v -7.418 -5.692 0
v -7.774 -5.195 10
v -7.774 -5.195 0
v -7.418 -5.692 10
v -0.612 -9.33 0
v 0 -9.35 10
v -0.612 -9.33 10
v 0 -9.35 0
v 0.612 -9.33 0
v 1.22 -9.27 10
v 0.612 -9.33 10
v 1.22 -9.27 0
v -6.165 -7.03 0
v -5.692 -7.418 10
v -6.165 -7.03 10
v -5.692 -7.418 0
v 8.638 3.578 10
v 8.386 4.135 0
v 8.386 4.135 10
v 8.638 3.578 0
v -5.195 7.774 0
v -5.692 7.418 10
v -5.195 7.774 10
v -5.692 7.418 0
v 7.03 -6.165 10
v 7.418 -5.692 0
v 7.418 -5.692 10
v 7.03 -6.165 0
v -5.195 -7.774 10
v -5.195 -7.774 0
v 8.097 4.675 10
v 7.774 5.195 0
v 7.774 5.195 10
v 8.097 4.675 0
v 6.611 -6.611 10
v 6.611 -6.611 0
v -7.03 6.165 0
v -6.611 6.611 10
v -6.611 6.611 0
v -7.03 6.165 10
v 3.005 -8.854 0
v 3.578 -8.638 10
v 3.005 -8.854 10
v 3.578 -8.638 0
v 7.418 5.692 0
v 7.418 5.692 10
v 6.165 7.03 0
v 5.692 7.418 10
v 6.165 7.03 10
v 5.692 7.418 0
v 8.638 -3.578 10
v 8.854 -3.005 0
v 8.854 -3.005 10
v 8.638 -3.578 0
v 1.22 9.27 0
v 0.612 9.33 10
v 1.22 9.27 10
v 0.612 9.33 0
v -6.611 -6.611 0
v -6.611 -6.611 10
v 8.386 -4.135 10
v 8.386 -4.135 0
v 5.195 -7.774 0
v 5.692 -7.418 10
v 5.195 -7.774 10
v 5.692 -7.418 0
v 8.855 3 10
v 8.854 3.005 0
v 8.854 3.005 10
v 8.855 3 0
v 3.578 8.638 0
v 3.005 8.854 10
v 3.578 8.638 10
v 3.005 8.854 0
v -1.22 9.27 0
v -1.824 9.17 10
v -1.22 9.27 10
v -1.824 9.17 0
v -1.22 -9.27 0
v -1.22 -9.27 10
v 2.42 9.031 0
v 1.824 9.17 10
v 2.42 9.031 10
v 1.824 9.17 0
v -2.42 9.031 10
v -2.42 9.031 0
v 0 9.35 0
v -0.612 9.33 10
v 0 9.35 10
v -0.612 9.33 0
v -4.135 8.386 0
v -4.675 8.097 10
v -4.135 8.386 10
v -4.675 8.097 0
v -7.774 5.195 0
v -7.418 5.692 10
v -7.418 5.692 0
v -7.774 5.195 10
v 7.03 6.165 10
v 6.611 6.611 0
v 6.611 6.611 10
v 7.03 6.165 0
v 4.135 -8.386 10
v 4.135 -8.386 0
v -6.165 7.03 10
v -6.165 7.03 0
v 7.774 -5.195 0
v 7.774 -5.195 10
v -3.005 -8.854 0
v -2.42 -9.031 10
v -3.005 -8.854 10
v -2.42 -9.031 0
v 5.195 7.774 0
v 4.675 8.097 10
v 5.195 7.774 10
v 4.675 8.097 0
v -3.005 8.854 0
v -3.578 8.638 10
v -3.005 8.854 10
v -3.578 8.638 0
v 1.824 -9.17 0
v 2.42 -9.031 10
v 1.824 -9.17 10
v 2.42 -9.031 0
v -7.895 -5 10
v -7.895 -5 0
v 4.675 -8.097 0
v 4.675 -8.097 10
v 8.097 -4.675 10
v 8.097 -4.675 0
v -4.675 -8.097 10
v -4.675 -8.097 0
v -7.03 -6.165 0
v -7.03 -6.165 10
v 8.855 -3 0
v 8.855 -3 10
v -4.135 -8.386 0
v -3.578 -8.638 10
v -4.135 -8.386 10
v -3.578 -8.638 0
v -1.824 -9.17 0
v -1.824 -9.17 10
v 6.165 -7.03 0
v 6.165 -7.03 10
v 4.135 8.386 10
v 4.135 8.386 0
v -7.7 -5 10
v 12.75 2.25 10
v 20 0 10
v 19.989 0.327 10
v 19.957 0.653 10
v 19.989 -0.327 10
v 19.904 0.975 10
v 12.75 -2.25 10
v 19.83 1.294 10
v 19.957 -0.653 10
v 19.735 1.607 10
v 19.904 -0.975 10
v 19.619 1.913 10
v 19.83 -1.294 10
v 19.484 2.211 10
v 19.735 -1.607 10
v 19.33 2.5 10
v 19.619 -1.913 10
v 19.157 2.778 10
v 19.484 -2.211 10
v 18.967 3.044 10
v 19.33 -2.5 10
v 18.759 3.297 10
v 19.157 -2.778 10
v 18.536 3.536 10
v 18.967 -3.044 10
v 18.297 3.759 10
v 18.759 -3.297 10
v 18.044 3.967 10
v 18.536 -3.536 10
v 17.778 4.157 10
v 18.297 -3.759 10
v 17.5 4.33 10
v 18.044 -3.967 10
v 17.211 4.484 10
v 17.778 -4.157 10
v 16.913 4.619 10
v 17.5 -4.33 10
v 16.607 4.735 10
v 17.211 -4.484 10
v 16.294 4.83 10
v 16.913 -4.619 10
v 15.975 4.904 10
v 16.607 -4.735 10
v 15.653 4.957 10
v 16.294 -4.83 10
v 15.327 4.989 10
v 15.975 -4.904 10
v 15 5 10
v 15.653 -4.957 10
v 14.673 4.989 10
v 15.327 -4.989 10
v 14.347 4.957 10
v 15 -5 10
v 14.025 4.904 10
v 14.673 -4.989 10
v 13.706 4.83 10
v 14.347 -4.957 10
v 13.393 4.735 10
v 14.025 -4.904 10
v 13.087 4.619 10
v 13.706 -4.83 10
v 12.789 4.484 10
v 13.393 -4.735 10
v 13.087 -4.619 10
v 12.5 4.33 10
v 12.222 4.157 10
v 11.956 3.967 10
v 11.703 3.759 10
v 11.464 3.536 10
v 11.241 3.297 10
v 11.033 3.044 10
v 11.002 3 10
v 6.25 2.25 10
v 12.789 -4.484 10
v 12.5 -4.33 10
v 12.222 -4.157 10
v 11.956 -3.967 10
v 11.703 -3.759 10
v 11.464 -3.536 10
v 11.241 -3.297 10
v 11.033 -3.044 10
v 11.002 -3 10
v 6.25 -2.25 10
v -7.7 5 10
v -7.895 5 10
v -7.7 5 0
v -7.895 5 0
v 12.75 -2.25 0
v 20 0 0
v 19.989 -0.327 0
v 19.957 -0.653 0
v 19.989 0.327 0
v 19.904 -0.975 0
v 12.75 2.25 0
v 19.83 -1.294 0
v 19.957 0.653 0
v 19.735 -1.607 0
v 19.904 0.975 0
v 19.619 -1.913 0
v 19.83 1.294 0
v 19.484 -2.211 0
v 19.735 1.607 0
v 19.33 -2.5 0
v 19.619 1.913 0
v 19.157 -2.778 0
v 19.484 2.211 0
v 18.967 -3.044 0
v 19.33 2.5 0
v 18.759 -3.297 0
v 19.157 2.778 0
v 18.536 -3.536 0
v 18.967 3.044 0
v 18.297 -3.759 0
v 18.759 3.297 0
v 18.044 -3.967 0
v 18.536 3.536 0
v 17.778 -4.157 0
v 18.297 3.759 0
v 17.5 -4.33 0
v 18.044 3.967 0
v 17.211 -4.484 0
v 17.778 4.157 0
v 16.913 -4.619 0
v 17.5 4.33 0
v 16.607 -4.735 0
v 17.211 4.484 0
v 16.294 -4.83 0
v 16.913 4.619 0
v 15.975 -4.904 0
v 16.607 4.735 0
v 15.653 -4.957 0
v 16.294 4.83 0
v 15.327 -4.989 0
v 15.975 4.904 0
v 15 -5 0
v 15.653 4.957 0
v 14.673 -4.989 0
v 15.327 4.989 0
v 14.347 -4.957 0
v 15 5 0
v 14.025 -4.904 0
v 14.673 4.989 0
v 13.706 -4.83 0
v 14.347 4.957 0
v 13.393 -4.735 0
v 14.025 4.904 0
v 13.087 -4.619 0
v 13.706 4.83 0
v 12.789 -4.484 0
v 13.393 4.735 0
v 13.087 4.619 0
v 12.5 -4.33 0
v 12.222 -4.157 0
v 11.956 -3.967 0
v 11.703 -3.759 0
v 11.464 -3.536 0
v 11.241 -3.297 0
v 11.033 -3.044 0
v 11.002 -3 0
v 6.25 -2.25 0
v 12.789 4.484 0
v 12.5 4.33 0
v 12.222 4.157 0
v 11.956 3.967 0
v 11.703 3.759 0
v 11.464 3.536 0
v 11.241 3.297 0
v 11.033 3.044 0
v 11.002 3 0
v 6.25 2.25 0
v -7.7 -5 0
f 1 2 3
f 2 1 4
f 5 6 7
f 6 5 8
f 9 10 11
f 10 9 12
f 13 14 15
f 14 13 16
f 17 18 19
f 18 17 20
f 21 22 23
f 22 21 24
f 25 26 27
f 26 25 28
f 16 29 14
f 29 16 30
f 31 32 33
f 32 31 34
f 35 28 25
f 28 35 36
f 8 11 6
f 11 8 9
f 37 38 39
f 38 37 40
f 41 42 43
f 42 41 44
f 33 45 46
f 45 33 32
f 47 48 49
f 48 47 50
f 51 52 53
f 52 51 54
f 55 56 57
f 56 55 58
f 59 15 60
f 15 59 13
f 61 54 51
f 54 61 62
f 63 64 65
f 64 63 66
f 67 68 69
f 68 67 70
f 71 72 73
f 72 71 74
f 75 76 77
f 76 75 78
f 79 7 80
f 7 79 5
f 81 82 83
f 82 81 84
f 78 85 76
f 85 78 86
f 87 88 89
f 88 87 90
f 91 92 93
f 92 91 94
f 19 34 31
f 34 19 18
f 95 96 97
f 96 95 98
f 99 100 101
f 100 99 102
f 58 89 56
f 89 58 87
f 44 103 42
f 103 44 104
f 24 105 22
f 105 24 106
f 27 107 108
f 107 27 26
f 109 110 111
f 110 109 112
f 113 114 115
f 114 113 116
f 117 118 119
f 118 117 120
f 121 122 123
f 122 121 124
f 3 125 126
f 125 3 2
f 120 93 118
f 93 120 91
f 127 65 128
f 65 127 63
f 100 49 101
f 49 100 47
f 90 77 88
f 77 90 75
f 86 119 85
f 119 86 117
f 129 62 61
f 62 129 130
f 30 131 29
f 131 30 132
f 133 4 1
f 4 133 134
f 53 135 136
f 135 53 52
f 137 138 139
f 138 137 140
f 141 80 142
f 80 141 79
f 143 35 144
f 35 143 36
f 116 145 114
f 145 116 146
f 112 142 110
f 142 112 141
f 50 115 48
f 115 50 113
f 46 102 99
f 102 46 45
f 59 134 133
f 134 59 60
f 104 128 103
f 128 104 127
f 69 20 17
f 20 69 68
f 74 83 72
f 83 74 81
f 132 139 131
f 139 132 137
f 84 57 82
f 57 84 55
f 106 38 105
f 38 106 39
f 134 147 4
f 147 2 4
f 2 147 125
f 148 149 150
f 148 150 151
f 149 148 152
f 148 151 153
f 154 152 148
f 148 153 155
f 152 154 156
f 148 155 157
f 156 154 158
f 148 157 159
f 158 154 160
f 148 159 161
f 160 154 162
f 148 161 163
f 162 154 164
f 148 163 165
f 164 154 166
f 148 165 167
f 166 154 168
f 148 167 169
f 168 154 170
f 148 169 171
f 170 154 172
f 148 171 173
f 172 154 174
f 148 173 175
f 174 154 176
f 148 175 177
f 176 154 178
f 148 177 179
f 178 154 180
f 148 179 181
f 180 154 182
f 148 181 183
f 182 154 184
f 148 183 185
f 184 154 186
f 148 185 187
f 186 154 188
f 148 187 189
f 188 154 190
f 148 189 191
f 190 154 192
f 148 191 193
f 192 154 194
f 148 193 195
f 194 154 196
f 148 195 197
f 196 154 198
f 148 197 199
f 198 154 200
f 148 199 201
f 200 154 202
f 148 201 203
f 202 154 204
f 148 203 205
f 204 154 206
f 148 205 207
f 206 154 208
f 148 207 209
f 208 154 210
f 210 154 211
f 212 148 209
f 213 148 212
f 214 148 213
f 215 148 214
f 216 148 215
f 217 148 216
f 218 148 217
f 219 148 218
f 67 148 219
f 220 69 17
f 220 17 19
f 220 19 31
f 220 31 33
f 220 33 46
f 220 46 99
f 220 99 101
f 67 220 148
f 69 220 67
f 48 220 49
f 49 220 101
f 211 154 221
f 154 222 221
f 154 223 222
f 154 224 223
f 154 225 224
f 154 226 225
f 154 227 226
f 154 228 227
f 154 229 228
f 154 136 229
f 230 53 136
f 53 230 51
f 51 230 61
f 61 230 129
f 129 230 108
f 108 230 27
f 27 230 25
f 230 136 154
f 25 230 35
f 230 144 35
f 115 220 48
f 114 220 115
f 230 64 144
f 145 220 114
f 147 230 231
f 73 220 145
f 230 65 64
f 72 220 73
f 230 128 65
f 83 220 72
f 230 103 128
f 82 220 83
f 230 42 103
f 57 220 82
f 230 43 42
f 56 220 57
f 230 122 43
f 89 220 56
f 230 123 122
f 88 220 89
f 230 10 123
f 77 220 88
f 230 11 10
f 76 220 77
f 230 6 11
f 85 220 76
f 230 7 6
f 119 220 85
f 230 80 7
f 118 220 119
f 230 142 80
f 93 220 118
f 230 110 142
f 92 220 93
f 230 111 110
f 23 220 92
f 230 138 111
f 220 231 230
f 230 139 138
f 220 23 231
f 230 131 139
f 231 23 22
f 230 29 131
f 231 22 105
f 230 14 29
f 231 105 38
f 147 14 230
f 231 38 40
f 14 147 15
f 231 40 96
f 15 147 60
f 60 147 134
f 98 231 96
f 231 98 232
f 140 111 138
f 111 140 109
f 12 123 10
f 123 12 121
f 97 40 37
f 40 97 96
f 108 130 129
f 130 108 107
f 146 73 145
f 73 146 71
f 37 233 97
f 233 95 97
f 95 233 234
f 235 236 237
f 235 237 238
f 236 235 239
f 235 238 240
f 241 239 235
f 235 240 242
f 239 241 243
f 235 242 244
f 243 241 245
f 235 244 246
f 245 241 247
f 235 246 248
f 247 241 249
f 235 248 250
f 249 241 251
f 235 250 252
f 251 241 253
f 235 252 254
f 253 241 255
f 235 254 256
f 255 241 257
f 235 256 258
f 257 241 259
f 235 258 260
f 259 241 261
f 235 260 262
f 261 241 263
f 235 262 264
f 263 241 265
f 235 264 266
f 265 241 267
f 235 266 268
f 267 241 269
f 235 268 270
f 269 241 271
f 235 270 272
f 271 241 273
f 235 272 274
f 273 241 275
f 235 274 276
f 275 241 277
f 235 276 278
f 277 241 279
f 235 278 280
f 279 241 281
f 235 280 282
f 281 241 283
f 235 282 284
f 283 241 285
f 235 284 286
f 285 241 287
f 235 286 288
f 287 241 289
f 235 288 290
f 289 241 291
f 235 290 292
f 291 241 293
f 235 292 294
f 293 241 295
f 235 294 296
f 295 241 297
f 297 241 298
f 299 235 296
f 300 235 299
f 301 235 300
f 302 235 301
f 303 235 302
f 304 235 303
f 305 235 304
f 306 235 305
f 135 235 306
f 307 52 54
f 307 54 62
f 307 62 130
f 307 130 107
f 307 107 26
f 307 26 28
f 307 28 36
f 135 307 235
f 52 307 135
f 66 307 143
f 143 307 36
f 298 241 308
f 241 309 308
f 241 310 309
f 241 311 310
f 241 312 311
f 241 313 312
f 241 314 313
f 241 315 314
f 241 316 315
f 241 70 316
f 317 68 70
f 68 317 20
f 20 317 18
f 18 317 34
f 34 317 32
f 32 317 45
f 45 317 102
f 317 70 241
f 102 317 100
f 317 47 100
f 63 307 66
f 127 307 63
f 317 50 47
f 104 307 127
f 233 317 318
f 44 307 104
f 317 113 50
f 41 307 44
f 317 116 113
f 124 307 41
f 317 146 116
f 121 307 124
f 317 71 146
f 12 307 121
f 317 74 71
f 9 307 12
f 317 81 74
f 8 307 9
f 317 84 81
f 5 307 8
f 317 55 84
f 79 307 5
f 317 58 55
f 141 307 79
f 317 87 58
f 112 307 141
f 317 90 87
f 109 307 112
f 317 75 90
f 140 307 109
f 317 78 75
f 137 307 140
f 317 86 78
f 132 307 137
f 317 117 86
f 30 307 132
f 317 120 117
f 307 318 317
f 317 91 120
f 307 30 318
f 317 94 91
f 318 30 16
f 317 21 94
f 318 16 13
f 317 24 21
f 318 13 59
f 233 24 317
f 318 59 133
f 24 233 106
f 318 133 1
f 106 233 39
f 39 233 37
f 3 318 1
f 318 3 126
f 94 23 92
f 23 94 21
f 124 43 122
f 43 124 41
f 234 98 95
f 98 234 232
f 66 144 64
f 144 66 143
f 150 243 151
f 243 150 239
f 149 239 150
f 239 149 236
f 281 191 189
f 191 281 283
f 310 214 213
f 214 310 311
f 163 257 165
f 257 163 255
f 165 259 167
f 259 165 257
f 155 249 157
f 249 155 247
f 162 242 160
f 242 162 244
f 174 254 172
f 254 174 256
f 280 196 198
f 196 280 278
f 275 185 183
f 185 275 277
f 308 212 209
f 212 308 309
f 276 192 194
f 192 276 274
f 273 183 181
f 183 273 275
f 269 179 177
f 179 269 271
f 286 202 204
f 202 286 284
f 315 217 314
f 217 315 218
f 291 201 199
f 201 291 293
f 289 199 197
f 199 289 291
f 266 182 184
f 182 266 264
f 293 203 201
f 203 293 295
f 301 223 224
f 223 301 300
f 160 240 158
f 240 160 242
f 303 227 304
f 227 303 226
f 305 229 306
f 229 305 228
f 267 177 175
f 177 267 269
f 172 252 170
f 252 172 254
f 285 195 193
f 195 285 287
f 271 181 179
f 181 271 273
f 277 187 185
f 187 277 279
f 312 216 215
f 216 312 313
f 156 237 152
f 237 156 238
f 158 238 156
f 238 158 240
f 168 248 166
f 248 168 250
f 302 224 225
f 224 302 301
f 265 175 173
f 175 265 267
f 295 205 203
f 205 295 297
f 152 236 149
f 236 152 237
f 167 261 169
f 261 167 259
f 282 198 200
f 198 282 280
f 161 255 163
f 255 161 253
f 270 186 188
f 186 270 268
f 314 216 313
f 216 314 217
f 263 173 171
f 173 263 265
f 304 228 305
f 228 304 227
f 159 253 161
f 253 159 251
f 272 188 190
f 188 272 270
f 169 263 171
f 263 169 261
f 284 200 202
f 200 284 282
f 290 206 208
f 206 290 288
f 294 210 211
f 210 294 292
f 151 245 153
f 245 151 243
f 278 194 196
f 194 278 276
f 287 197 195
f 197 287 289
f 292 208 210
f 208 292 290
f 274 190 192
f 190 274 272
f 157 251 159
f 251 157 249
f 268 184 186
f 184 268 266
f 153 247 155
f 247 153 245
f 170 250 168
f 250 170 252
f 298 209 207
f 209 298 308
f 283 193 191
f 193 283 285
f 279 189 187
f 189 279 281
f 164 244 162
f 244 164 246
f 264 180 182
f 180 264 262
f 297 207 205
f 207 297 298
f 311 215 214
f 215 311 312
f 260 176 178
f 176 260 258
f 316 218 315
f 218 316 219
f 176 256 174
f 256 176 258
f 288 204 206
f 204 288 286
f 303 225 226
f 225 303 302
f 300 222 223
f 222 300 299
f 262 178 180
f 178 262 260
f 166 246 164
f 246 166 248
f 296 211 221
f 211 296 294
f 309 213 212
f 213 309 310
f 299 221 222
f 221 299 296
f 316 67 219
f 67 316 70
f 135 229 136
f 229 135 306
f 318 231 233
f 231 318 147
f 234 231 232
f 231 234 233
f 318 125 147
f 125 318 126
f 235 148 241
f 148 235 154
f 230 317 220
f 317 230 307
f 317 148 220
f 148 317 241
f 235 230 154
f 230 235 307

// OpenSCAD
// Tubing clip for 12.7 mm stand rod
// Print orientation: flat on bed, extruded in +Z

$fn = 96;

// ---- Ring dimensions ----
rod_id   = 12.7;   // stand rod inner diameter
rod_wall = 3;      // rod ring wall thickness
ring_od  = rod_id + 2 * rod_wall; // 18.7 mm outer diameter

tube_id  = 6;      // tubing inner diameter
tube_wall = 2;     // tubing ring wall thickness
tube_od  = tube_id + 2 * tube_wall; // 10 mm outer diameter

// ---- Opening dimensions ----
rod_open_w = 10;   // rod ring -X opening width (y = +/-5)
tube_open_w = 4.5; // tubing ring +X opening width (y = +/-2.25)

// ---- Bridge ----
bridge_x0 = 8;     // bridge start (x)
bridge_x1 = 12;    // bridge end (x)
bridge_w  = 6;     // bridge width in Y

// ---- Extrusion ----
height = 10;       // Z height of 2-D profile

difference() {
    union() {
        // Rod ring
        cylinder(h = height, d = ring_od);
        // Tubing ring
        translate([15, 0, 0])
            cylinder(h = height, d = tube_od);
        // Bridge
        translate([bridge_x0, -bridge_w / 2, 0])
            cube([bridge_x1 - bridge_x0, bridge_w, height]);
    }
    // Cut out the stand rod opening (-X side)
    translate([-ring_od - 1, -rod_open_w / 2, -1])
        cube([rod_open_w + 2, rod_open_w, height + 2]);

    // Cut out the tubing opening (+X side)
    translate([15 + tube_open_w / 2 - tube_od - 1, -tube_open_w / 2, -1])
        cube([tube_open_w + 2, tube_open_w, height + 2]);
}
